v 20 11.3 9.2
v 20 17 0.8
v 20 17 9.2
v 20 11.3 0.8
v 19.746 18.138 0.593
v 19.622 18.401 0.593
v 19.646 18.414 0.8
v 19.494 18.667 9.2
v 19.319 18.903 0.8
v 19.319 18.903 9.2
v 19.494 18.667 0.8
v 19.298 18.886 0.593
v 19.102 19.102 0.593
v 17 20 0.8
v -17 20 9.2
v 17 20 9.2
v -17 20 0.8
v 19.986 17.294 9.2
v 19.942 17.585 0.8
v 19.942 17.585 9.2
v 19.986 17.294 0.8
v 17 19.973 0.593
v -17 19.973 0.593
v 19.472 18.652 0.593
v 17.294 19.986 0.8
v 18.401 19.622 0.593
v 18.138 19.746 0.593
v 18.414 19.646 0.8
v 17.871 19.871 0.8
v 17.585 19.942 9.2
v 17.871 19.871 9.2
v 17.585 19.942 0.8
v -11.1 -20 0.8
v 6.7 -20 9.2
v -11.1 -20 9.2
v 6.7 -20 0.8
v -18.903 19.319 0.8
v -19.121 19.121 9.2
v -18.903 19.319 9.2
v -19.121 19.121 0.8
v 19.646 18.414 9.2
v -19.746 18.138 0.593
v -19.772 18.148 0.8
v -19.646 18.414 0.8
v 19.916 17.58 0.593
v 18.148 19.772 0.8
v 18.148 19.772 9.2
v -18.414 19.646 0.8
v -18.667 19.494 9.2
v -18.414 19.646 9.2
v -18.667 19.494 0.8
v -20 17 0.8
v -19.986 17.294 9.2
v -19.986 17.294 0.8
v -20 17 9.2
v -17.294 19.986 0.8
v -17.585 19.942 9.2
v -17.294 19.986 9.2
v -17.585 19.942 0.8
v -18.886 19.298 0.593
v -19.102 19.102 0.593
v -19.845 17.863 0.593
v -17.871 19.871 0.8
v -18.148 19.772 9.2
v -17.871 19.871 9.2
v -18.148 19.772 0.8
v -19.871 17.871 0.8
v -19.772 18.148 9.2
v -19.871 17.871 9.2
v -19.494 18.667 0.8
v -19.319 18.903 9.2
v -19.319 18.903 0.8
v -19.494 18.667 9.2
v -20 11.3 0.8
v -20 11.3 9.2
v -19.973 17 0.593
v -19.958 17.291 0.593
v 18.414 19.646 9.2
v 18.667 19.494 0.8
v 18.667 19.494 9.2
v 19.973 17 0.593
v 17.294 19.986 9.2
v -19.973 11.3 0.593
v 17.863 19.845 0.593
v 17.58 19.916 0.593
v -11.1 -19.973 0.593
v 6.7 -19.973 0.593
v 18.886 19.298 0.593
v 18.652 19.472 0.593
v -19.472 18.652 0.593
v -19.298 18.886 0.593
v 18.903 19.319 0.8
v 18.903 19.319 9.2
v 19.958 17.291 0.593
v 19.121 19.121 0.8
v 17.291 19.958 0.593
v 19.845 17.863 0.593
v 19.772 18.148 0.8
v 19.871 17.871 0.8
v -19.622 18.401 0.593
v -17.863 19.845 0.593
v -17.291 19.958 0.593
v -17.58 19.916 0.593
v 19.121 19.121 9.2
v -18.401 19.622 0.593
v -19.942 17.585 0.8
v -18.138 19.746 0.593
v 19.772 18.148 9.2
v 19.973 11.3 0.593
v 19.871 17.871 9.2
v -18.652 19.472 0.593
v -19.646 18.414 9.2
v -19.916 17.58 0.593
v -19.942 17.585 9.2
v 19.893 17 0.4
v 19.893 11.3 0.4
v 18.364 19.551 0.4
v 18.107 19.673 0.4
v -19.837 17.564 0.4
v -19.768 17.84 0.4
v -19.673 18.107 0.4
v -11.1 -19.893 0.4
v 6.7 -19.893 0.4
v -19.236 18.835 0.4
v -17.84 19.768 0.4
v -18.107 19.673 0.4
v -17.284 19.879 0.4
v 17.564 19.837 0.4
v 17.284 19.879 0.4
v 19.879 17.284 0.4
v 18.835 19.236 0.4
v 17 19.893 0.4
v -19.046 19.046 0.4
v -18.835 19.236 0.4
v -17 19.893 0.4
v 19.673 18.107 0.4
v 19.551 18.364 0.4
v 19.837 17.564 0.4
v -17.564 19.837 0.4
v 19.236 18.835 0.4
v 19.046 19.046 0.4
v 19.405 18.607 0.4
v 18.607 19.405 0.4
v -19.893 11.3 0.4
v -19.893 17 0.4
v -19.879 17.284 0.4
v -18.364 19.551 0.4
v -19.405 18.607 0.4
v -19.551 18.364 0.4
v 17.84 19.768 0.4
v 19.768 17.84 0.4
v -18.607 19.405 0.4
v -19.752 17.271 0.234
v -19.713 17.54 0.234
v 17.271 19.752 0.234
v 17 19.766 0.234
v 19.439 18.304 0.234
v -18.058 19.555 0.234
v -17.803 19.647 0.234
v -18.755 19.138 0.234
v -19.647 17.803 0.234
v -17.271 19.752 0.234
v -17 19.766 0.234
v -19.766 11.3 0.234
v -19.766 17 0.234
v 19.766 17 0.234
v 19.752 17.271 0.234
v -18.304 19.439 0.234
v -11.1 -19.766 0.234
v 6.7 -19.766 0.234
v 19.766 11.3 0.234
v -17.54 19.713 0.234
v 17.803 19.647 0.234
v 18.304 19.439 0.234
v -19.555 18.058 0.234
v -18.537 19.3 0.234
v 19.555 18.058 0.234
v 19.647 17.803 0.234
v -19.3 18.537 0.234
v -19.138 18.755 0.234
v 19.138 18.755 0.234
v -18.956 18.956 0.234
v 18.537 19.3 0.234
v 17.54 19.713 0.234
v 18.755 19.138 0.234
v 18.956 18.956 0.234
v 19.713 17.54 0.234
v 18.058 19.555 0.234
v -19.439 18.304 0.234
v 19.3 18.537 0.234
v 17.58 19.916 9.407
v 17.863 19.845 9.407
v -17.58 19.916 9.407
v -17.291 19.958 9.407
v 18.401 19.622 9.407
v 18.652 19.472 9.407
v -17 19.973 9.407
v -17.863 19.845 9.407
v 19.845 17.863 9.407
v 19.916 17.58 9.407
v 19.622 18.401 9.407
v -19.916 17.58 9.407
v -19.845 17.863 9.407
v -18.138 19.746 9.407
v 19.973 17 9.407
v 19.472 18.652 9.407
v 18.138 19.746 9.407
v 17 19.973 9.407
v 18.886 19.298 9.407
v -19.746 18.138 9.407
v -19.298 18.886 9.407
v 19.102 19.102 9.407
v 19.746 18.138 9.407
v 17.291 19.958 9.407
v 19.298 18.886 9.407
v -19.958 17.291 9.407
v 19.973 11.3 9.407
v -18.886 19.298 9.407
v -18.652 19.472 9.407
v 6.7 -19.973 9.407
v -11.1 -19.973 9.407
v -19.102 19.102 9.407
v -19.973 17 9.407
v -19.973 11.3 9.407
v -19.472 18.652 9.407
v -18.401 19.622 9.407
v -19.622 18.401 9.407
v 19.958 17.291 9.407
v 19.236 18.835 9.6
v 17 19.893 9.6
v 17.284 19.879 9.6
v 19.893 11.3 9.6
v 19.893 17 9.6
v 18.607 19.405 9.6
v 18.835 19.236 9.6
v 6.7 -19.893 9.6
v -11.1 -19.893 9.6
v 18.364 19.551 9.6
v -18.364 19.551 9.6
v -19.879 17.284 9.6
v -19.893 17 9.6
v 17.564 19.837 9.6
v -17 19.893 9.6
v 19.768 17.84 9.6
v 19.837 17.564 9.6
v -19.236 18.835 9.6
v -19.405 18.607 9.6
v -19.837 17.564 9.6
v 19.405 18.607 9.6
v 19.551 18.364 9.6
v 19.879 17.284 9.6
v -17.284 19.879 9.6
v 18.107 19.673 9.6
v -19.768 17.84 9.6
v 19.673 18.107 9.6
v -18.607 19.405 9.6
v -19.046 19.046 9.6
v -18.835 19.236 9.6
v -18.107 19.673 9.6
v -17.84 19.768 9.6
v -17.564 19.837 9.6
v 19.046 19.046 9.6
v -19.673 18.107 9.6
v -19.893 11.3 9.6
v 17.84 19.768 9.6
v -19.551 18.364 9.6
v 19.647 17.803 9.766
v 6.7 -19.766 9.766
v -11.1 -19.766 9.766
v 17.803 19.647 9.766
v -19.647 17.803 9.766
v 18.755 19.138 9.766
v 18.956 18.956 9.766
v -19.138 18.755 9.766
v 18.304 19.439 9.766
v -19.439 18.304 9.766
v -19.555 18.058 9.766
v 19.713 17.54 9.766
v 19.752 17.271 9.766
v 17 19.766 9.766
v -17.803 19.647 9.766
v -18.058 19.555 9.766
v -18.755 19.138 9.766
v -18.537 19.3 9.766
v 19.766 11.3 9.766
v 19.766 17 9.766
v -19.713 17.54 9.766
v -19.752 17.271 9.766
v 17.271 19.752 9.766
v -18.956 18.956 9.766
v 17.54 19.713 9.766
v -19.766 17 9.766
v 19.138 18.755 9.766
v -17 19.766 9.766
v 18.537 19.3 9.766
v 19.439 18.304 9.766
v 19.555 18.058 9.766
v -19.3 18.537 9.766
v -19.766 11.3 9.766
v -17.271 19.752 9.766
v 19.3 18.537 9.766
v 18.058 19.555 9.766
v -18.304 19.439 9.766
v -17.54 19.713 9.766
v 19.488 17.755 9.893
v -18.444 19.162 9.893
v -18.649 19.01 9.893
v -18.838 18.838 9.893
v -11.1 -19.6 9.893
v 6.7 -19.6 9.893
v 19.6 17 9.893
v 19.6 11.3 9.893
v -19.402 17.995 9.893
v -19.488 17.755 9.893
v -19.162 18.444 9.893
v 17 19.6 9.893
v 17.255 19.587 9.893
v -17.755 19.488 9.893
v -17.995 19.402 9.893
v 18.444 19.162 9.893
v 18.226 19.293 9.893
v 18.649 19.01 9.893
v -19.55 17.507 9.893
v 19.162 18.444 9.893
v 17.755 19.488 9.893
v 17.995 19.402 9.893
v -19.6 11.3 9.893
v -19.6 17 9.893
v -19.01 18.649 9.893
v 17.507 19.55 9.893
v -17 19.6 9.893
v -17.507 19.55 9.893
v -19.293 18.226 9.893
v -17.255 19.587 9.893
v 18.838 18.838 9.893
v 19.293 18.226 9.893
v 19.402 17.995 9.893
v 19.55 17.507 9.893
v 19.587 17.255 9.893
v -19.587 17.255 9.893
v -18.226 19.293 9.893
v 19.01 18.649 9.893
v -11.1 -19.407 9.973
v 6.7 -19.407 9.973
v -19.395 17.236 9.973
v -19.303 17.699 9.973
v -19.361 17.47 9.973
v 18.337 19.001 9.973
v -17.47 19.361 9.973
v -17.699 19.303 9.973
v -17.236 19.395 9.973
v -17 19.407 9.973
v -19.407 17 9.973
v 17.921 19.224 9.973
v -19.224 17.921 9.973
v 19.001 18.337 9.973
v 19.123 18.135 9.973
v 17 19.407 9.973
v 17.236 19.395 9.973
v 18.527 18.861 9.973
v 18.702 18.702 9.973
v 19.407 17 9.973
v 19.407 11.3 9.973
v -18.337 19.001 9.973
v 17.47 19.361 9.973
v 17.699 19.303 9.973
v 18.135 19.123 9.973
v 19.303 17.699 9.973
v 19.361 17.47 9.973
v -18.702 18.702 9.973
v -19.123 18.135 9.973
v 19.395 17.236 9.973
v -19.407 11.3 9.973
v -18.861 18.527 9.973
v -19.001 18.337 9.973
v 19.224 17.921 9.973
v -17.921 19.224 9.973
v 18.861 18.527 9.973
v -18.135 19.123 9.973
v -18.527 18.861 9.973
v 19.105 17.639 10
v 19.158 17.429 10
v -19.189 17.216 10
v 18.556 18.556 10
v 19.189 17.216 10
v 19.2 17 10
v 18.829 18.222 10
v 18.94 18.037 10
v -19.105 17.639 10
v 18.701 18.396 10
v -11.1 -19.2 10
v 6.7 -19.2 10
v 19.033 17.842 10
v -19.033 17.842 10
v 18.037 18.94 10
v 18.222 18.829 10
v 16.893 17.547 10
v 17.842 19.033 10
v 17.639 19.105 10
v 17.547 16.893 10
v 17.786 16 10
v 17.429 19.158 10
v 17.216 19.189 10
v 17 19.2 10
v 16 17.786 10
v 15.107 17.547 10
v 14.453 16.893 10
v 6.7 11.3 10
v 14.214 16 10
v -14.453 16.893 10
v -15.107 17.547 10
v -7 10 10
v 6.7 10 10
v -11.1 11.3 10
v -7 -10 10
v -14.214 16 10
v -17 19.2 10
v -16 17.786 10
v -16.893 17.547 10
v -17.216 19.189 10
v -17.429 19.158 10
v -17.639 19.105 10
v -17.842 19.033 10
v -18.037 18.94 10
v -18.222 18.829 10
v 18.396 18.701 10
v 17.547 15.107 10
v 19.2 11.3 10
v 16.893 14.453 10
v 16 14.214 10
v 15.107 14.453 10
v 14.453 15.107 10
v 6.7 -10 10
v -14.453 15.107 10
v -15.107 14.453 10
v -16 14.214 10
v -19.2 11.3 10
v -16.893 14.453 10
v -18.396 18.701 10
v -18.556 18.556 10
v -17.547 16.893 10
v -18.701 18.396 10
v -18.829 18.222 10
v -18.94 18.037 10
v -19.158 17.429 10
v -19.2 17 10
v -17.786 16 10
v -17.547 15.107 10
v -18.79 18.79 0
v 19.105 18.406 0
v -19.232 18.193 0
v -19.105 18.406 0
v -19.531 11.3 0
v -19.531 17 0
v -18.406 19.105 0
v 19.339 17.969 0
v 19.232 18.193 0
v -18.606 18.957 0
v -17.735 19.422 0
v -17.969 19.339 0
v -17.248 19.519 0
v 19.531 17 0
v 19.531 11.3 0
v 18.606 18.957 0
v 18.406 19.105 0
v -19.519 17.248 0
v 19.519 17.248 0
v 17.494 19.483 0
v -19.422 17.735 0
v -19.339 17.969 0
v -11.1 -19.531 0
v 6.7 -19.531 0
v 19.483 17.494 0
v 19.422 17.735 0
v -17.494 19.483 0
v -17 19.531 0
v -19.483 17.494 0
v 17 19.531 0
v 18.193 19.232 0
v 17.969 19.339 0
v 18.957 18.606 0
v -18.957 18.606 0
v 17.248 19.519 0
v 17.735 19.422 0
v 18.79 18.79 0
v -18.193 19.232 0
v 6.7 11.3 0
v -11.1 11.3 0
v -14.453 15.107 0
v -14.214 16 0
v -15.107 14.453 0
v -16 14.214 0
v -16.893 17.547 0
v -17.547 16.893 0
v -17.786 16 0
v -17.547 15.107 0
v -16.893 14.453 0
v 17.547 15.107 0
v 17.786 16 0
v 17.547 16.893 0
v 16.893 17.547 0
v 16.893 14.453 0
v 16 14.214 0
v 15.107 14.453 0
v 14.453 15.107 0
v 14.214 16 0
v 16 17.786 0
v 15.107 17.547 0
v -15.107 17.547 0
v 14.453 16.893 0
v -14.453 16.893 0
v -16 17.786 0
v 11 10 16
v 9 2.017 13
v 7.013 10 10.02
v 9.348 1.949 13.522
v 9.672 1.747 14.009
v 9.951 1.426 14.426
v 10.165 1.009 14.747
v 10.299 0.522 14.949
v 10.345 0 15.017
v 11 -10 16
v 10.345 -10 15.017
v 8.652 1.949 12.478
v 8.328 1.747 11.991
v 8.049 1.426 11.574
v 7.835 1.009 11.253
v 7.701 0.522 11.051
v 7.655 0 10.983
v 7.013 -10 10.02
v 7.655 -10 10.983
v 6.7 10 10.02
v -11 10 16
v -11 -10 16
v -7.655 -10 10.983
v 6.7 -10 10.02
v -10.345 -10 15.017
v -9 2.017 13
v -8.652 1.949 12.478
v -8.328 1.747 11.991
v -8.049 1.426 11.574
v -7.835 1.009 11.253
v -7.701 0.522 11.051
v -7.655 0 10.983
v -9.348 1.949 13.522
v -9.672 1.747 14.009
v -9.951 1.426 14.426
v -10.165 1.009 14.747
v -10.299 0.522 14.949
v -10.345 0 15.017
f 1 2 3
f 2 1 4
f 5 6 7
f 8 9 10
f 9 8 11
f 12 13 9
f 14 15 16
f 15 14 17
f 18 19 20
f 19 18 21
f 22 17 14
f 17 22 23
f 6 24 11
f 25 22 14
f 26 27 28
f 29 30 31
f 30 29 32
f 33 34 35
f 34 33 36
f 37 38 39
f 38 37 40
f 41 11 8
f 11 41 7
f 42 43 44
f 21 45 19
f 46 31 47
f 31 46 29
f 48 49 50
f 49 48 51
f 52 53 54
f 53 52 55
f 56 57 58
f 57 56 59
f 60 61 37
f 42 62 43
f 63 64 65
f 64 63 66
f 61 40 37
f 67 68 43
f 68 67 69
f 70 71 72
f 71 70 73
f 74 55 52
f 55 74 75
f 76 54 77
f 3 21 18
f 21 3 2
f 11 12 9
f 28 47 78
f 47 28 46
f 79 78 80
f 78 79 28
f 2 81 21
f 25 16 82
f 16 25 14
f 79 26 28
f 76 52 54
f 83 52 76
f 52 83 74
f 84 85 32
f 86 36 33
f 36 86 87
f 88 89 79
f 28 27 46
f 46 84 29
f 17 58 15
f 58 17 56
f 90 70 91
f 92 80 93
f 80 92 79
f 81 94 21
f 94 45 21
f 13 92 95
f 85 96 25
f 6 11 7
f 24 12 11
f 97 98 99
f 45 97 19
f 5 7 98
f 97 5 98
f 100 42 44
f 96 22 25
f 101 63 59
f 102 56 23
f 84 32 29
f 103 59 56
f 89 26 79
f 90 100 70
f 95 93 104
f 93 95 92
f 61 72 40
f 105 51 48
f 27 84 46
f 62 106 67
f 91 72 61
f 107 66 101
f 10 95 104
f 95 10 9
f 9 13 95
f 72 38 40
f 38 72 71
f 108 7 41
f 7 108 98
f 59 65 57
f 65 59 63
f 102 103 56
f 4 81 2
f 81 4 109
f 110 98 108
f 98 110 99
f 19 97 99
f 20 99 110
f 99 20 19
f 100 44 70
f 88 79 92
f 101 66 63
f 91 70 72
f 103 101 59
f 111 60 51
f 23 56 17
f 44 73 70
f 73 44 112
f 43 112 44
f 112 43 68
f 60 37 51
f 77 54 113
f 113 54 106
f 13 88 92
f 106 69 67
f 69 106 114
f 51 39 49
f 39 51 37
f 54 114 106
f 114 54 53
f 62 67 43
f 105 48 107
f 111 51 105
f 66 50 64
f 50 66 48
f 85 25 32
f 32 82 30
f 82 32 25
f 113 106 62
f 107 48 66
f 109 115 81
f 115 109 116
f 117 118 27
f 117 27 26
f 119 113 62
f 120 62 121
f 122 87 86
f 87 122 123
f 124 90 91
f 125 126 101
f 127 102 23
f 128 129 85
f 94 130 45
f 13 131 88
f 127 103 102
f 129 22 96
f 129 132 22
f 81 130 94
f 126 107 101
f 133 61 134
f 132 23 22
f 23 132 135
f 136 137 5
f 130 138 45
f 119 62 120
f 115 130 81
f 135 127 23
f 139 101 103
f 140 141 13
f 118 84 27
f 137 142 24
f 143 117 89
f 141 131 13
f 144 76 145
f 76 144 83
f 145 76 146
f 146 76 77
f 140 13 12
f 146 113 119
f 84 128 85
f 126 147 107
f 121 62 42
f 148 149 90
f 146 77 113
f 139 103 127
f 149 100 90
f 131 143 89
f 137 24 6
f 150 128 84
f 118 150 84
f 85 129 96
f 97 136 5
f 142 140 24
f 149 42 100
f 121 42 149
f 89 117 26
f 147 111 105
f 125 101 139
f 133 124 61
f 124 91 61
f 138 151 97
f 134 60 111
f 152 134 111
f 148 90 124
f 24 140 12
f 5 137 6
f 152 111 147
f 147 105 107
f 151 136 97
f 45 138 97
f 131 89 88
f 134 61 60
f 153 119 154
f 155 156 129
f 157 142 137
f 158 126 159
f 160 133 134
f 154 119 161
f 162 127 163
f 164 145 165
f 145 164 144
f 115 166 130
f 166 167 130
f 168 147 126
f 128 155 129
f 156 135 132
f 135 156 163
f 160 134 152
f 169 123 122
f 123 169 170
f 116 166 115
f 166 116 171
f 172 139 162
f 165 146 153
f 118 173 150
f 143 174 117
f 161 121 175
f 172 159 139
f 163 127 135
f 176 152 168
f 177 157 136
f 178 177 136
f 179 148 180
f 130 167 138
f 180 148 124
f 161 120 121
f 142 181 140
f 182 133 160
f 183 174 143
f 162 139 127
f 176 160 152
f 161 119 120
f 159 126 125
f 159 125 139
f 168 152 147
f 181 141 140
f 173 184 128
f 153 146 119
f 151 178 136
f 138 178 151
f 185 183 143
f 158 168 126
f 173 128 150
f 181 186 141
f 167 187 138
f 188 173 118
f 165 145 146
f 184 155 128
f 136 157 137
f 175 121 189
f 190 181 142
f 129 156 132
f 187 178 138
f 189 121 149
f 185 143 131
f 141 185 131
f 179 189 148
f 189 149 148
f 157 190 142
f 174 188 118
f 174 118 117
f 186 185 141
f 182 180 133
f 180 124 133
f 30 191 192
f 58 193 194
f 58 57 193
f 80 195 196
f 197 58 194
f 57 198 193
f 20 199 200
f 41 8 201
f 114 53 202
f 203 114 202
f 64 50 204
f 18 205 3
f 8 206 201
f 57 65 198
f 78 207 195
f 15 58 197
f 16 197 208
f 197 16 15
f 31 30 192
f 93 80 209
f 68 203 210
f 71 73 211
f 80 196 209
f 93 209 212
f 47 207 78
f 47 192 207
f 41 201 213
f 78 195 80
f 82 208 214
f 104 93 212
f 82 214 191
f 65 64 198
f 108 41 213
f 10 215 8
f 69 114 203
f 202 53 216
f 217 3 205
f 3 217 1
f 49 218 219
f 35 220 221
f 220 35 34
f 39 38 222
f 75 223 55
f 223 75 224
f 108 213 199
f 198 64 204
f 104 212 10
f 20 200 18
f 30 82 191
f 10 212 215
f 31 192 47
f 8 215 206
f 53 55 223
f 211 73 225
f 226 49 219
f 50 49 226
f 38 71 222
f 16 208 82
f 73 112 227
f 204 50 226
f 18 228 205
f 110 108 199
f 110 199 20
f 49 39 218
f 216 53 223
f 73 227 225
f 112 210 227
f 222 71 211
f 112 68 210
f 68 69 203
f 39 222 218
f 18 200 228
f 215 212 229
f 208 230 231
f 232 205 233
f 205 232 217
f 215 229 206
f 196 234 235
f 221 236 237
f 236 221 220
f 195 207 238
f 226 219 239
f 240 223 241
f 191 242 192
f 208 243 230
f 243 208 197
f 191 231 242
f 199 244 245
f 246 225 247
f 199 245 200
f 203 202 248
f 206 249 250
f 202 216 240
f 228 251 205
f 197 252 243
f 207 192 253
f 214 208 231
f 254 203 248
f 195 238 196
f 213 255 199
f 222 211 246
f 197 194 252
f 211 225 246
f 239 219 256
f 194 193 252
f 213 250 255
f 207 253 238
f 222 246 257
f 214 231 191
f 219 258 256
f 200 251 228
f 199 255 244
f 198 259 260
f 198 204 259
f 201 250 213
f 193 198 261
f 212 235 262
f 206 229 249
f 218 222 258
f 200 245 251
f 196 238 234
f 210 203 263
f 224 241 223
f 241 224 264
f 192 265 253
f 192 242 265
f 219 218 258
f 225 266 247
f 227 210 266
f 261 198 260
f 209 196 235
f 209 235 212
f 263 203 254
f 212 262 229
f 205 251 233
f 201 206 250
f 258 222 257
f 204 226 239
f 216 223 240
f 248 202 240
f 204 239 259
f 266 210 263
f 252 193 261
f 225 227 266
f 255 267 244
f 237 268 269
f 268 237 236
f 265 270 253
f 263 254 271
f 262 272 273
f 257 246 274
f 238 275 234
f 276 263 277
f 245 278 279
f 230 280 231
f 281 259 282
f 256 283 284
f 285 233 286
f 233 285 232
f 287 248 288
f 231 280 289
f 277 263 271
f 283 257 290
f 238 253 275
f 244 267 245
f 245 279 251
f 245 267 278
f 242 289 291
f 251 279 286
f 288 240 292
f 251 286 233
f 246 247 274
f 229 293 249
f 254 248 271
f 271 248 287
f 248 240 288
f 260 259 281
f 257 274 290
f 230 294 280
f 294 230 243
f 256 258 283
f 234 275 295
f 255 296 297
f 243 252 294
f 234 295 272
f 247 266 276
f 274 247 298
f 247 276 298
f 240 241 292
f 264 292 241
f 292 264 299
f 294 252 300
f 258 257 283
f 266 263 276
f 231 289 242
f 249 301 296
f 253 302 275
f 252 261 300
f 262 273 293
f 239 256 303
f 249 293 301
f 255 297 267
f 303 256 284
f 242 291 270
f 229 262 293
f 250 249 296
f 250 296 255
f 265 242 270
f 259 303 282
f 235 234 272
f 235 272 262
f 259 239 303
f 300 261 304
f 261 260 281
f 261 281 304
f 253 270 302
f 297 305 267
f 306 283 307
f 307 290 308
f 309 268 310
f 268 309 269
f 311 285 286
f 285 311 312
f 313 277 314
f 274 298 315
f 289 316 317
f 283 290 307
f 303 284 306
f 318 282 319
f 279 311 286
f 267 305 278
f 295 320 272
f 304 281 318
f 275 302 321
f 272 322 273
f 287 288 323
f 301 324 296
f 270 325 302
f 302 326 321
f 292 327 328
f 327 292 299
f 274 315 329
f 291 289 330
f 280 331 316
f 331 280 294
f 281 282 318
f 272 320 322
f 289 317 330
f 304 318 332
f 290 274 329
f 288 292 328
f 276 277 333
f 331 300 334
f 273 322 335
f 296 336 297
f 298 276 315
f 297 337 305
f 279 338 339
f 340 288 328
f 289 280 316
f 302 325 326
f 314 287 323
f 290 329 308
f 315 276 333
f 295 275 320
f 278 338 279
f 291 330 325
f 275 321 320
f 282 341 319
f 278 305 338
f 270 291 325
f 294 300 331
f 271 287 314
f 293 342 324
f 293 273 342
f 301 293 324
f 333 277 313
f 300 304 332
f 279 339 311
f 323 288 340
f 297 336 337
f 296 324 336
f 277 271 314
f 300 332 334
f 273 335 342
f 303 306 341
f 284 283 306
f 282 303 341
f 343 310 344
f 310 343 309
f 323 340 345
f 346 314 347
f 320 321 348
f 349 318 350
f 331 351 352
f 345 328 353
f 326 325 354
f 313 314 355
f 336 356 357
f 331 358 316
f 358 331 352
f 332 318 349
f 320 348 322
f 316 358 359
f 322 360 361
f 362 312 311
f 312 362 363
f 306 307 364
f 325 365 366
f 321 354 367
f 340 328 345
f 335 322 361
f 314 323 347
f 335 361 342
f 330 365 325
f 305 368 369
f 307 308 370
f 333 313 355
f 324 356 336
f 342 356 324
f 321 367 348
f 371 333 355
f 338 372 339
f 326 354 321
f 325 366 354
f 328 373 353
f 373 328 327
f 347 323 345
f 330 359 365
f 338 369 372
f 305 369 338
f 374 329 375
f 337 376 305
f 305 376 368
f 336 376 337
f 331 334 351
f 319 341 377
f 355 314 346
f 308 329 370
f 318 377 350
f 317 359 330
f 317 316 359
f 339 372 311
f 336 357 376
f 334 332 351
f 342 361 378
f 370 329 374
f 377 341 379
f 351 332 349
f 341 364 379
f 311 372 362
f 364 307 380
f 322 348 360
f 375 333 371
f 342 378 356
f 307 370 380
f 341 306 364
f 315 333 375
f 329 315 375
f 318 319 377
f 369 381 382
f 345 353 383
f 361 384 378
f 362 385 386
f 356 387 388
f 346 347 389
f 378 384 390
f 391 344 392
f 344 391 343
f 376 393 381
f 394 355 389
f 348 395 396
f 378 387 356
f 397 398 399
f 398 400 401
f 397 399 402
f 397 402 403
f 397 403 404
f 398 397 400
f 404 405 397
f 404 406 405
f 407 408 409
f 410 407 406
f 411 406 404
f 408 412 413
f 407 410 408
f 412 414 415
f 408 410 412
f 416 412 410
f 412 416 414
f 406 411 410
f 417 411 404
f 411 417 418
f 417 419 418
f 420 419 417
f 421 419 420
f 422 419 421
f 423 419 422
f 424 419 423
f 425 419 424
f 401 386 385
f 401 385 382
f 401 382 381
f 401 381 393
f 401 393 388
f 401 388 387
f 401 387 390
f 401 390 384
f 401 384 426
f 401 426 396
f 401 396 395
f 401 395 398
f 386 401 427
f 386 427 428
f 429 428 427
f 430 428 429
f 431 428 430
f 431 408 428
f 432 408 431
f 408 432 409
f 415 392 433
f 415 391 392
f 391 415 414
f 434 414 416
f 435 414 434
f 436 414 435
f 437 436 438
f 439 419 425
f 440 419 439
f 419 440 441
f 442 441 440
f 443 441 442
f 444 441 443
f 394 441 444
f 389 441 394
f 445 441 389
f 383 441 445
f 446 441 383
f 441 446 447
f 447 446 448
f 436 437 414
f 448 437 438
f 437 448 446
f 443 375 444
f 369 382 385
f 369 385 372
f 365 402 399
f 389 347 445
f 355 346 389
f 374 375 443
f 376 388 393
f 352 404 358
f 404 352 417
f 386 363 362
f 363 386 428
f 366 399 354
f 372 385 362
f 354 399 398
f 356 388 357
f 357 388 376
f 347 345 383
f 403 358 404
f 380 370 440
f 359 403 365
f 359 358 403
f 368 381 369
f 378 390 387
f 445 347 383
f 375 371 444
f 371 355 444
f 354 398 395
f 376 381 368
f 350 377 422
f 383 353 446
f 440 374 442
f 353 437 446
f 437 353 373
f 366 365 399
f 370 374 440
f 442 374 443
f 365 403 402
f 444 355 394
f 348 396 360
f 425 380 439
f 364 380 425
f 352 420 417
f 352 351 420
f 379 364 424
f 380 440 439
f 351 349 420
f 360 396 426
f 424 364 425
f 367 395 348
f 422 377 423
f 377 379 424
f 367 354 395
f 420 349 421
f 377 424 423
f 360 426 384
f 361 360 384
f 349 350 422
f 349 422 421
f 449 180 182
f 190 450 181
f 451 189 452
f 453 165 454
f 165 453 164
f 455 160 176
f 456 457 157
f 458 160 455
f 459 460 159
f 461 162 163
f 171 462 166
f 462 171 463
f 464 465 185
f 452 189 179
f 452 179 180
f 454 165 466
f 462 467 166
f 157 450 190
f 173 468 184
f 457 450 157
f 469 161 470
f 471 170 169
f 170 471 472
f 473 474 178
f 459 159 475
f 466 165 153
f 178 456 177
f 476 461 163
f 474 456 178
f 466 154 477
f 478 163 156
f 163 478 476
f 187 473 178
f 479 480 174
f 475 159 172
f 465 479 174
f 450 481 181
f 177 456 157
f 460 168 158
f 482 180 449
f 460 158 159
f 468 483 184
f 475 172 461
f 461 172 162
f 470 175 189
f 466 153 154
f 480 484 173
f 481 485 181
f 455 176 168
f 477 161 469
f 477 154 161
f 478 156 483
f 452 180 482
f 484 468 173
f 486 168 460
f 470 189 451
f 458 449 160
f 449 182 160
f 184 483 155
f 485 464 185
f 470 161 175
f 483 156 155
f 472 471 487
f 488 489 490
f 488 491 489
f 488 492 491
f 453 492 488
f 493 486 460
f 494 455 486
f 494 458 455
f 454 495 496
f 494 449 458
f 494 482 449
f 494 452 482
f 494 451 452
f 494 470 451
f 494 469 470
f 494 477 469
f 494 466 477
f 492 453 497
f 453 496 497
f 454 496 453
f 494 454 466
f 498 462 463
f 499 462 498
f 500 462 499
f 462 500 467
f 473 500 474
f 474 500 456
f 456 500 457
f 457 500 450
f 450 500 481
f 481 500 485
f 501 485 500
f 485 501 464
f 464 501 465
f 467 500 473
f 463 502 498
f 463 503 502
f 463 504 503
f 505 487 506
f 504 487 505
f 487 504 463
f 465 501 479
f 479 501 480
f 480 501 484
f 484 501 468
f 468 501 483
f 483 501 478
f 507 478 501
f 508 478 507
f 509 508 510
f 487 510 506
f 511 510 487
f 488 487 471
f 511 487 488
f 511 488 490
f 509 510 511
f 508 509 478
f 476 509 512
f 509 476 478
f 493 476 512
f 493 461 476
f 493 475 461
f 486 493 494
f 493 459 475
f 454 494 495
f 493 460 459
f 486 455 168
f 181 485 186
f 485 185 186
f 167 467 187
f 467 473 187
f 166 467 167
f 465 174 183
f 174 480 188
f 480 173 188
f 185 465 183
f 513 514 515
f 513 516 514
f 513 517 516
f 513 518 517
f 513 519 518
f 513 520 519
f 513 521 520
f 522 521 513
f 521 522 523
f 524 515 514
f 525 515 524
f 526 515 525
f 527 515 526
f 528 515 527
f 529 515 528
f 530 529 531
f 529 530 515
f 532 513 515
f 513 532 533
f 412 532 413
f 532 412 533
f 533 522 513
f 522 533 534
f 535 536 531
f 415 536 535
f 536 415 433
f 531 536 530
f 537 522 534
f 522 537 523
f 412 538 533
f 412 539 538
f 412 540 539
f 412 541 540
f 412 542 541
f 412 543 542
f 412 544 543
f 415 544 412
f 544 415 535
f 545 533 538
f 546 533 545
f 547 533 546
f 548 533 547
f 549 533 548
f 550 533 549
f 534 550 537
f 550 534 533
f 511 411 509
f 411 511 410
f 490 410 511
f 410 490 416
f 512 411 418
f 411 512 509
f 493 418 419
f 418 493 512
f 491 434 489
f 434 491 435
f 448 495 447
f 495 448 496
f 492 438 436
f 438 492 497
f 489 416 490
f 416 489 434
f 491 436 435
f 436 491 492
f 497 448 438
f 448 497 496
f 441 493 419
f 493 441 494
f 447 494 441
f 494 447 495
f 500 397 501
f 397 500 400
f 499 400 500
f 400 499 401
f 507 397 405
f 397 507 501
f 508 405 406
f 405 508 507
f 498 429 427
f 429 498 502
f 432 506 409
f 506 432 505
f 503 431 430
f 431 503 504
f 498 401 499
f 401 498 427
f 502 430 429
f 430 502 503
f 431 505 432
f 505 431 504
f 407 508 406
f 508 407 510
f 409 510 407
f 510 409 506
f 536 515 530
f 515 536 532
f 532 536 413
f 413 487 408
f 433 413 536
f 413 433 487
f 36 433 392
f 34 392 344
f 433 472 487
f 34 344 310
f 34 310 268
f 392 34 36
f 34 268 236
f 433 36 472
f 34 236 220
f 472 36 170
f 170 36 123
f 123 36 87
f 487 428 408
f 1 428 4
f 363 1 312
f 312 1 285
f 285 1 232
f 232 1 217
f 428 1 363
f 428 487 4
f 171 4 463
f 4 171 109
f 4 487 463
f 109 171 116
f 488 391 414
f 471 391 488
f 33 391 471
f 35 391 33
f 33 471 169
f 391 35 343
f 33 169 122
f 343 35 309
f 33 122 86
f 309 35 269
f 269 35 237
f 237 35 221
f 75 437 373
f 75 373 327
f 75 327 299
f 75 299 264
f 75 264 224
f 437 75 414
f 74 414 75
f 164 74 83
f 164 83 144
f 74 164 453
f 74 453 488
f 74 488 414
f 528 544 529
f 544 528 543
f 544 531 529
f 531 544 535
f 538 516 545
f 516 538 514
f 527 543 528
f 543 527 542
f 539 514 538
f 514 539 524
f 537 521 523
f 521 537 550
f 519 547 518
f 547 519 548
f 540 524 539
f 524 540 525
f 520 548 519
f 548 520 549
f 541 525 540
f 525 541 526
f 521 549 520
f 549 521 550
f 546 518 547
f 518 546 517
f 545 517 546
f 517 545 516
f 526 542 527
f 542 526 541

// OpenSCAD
// Reusable trial interfaces, mm. Authoritative geometry; no rated load.
use <../../../../scad/lib/util.scad>
/* [Output] */
part = "slide_male"; // [slide_male,slide_female,slide_gib,snap_male,snap_female,twist_male,twist_male_mount,twist_female,knob,twist_knob]
/* [Common interface - provisional] */
pad = 40;
pad_t = 4;
mount_pitch = 32;
mount_d = 3.45;
gap = 0.30; // per-side fit allowance
edge_relief = 0.35;
touch_fillet = 0.8; // exposed upper edges; keep flat print/mounting faces
plate_corner_r = 3;
/* [Metal hardware - measure before printing] */
bolt_nominal = 3;
slide_bolt_length = 40;
twist_bolt_length = 40;
thread_pitch = 0.5;
unlock_turns = 3;
bolt_d = bolt_nominal + 0.45;
hex_af = 5.75; // M3 head/nut nominal AF5.5, +0.25
head_seat = 3.8; // knob bearing face to underside of bolt HEAD
slide_nut_x = -16.5;
twist_nut_x = -15.5;
nut_loading_clearance = 0.15;
washer_d = 7;
washer_id = 3.2;
washer_t = 0.5;
metal_af = 5.5;
metal_nut_t = 2.4;
metal_head_h = 2.12;
knob_d = 22;
knob_h = 10;
/* [Dovetail] */
slide_plate_t = 10; // thicker upper mounting plate clears the D22 knob
rail_l = 20;
rail_neck = 14;
rail_head = 22;
rail_h = 6;
slide_floor = 9; // raises the knob swept envelope above the mounting plane
slide_cheek_x = -14;
slide_gib_x = 18;
slide_preload_x = gap*(1+(rail_head-rail_neck)/(2*rail_h));
slide_opening = 1.0;
slide_slot_d = 4.0;
/* [Side release] */
arm_l = 36;
arm_t = 1.4;
arm_x = 9;
snap_t = 4;
snap_floor = 3;
snap_inner = 22.6;
snap_wall = 2.5;
snap_roof = 2.4;
hook_out = 15.3;
hook_back = 15.3;
hook_ramp = 19;
snap_entry = -12;
snap_end = 27;
snap_tab_l = 12;
snap_seat_y = -0.15;
/* [Bayonet] */
twist_plate_t = 6; // upper mounting plate, female base remains 4 mm
post_d = 14;
post_h = 8;
lug_r = 10.5;
lug_w = 6;
lug_t = 3;
ring_d = 28;
ring_h = 14;
turn_deg = 60;
entry_angle = 80;
twist_face_x = 20; // through bolt runs from the left cheek to the right knob
twist_axis_z = 14;
twist_knob_d = 16; // keep the entire side knob below the upper mounting plane
twist_cam_lift = 0.60; // axial draw over the 60-degree turn
twist_pad_t = 1.0; // user-confirmed rubber thickness; not a printed part
twist_pad_depth = 0.40; // shallow male-side pocket retains 40% of rubber thickness
twist_pad_side_clearance = 0.20; // each side of the 5 x 8 mm rubber cut
twist_pad_compression = 0.10; // provisional nominal squeeze
twist_lock_gap = twist_pad_t-twist_pad_depth-twist_pad_compression;
twist_pad_w = 5.0; // X/radial cut width
twist_pad_l = 8.0; // Y/tangential cut length
twist_pad_r = 10.5; // centres of two rectangular pads on male underside
/* [Hidden] */
$fn = 64;
eps = 0.02;
slide_z = slide_plate_t + slide_floor + rail_h + gap;
slide_axis_z = slide_floor + rail_h/2;
track_floor = pad_t + ring_h - post_h;
twist_z = pad_t + ring_h + twist_plate_t + twist_lock_gap;
snap_socket_h = snap_floor + snap_t + 2*gap + snap_roof;
assert(gap > 0 && gap < 0.8);
assert(rail_head > rail_neck && rail_head/2+gap < pad/2-2);
assert(hex_af > metal_af && knob_h-head_seat >= metal_head_h);
assert(slide_nut_x-nut_loading_clearance > -pad/2+2);
assert(twist_nut_x-nut_loading_clearance > -pad/2+2);
assert(slide_z-gap-slide_axis_z-knob_d/2 >= 1);
assert(thread_pitch*unlock_turns >= slide_opening);
assert(twist_axis_z+4 <= pad_t+ring_h);
assert(twist_axis_z+twist_knob_d/2 < twist_z);
assert(hook_out > snap_inner/2 && arm_x-arm_t/2 > 5);
assert(ring_d/2 > sqrt(pow(lug_r+gap,2)+pow(lug_w/2+gap,2))+2);
assert(twist_pad_depth > 0 && twist_pad_depth < twist_pad_t);
assert(twist_pad_compression > 0 && twist_pad_compression < twist_pad_t*0.15);
assert(twist_lock_gap > 0);
assert(twist_pad_r-twist_pad_w/2-twist_pad_side_clearance > post_d/2+0.5);
assert(sqrt(pow(twist_pad_r+twist_pad_w/2+twist_pad_side_clearance,2)+pow(twist_pad_l/2+twist_pad_side_clearance,2)) < ring_d/2-0.1);
function twist_cam_height(a) = track_floor+lug_t+twist_lock_gap+twist_cam_lift*(1-a/turn_deg);
function twist_draw_offset(angle) = twist_cam_lift*min(1,max(0,-angle/turn_deg));

module mounting_holes(y0=0, y_pitch=mount_pitch, thickness=pad_t) {
    for(x=[-mount_pitch/2,mount_pitch/2],y=[y0-y_pitch/2,y0+y_pitch/2])
        translate([x,y,-eps]) hole(mount_d,thickness+2*eps,fn=12);
}
module pad_blank(y0=0, thickness=pad_t) {
    translate([-pad/2,y0-pad/2,0]) touch_box(pad,pad,thickness,plate_corner_r);
}
// Quarter-circle top fillet, using convex loft segments instead of a costly
// global Minkowski operation that would alter holes and mating surfaces.
module touch_box(w,d,h,r=1,fillet=touch_fillet) {
    f=min(fillet,h/3,r);
    translate([0,0,f]) rrect_prism(w,d,h-2*f,r);
    // Lower fillet is trimmed at 45 degrees into a bed chamfer. This keeps
    // layer growth <= layer height instead of the steep start of a full fillet.
    hull() {
        inset=max(edge_relief,f*(2-sqrt(2)));
        translate([inset,inset,0]) rrect_prism(w-2*inset,d-2*inset,eps,max(0.1,r-inset));
        inset2=f*(1-cos(45));
        translate([inset2,inset2,f*(1-sin(45))])
            rrect_prism(w-2*inset2,d-2*inset2,eps,max(0.1,r-inset2));
    }
    for(a=[0:15:30]) hull() for(t=[a,a+15]) {
        inset=f*(1-cos(t));
        translate([inset,inset,f*(1-sin(t))])
            rrect_prism(w-2*inset,d-2*inset,eps,max(0.1,r-inset));
    }
    for(a=[0:15:75]) hull() for(t=[a,a+15]) {
        inset=f*(1-cos(t));
        translate([inset,inset,h-f+f*sin(t)-eps])
            rrect_prism(w-2*inset,d-2*inset,eps,max(0.1,r-inset));
    }
}
module hex_cut(depth) {
    rotate([0,0,30]) cylinder(r=hex_af/sqrt(3),h=depth,$fn=6);
}
// Horizontal screw bore: round part + upward 45-degree roof relief.
module x_bore(length) {
    roof_tip = (bolt_d/2)/cos(180/16)*sqrt(2);
    rotate([0,90,0]) hole(bolt_d,length,fn=16);
    translate([0,-roof_tip,0]) rotate([0,90,0])
        linear_extrude(length) polygon([[0,0],[-roof_tip,roof_tip],[0,2*roof_tip]]);
}
// Recessed nut receiver: no external clip; continuous body within the pad footprint.
// Upward loading channel has no roof and therefore needs no internal support.
module fixed_nut_blank(z_axis) {
    translate([-pad/2,-5,pad_t-eps]) touch_box(pad/2-12,10,z_axis+4-pad_t+eps,1);
}
module fixed_nut_cuts(nut_x,z_axis) {
    translate([nut_x-nut_loading_clearance,0,z_axis]) rotate([0,90,0])
        hex_cut(metal_nut_t+nut_loading_clearance);
    translate([nut_x-nut_loading_clearance,-hex_af/sqrt(3),z_axis])
        cube([metal_nut_t+nut_loading_clearance,2*hex_af/sqrt(3),4+eps]);
}
module hand_knob(diameter=knob_d) {
    difference() {
        union() {
            rounded_knob_cylinder(diameter-3);
            for(a=[0:60:300]) rotate([0,0,a]) translate([(diameter-5)/2,0,0]) rounded_knob_cylinder(5);
        }
        translate([0,0,-eps]) hole(bolt_d,knob_h+2*eps,fn=16);
        // Bolt head bears on a 3.8 mm floor. Hex shape transmits torque.
        // A small adhesive spot keeps the head with the knob when removed.
        translate([0,0,head_seat]) hex_cut(knob_h-head_seat+eps);
    }
}
module rounded_knob_cylinder(d) {
    cylinder(d=d,h=knob_h-touch_fillet);
    for(a=[0:15:75]) hull() for(t=[a,a+15])
        translate([0,0,knob_h-touch_fillet+touch_fillet*sin(t)-eps])
            cylinder(d=d-2*touch_fillet*(1-cos(t)),h=eps);
}

// Male is printed pad down. Closed assembly flips it over the female.
module rail_profile(extra=0) {
    polygon([[-rail_neck/2-extra,slide_plate_t], [rail_neck/2+extra,slide_plate_t],
             [rail_head/2+extra,slide_plate_t+rail_h],[-rail_head/2-extra,slide_plate_t+rail_h]]);
}
module slide_male() {
    difference() {
        union() {
            pad_blank(thickness=slide_plate_t);
            // rotate maps the profile XY to XZ, extrusion along -Y
            translate([0,rail_l/2,0]) rotate([90,0,0]) linear_extrude(rail_l) rail_profile();
        }
        mounting_holes(thickness=slide_plate_t);
        // Open plate notches clear the gib and left head cradle during withdrawal.
        translate([rail_neck/2-gap,-pad/2-eps,-eps]) cube([pad,pad/2+11.3+eps,slide_plate_t+2*eps]);
        translate([-pad+slide_cheek_x+2+slide_preload_x+gap+0.1,-pad/2-eps,-eps]) cube([pad,pad/2+11.3+eps,slide_plate_t+2*eps]);
        // Longitudinal open slot: the through bolt can stay in place when sliding out.
        hull() for(y=[0,-rail_l/2-slide_slot_d])
            translate([-rail_head,y,slide_plate_t+rail_h/2]) rotate([0,90,0])
                hole(slide_slot_d,2*rail_head,fn=24);
    }
}
module slide_female() {
    difference() {
        union() {
            pad_blank();
            translate([-rail_head/2-3,-rail_l/2,pad_t-eps]) touch_box(rail_head+6,rail_l,slide_floor-pad_t+rail_h+eps,1);
            translate([-rail_head/2-3,rail_l/2+gap,pad_t-eps]) touch_box(rail_head+6,3,slide_floor-pad_t+rail_h+eps,1);
            translate([slide_cheek_x,-5,pad_t]) touch_box(2,10,12.2,0.6);
            // Broad recessed fixed-nut receiver, integral with base and left cheek.
            fixed_nut_blank(slide_axis_z);
        }
        mounting_holes();
        // Channel widens downward; the lips provide positive Z retention.
        translate([0,rail_l/2,0]) rotate([90,0,0]) linear_extrude(rail_l+1)
            polygon([[-rail_head/2-gap-gap*(rail_head-rail_neck)/(2*rail_h),slide_floor],
                     [rail_head/2+gap+gap*(rail_head-rail_neck)/(2*rail_h),slide_floor],
                     [rail_neck/2+gap,slide_floor+rail_h+gap],[-rail_neck/2-gap,slide_floor+rail_h+gap]]);
        // Separate moving right flank and its chamfered foot.
        translate([5.8,-rail_l/2-eps,slide_floor]) cube([pad,rail_l+2*eps,rail_h+3]);
        translate([rail_head/2-slide_preload_x-gap,-rail_l/2-eps,pad_t])
            cube([pad,rail_l+2*eps,slide_floor-pad_t]);
        // Clear the lower swept rim of the nut knob; keep all four mounting holes.
        translate([slide_gib_x+washer_t-gap,-knob_d/2-gap,-eps])
            cube([pad,knob_d+2*gap,pad_t+2*eps]);
        translate([-pad,0,slide_axis_z]) x_bore(2*pad);
        fixed_nut_cuts(slide_nut_x,slide_axis_z);
    }
}

// Print with outer X face down: vertical bolt bore and no enclosed roof.
module slide_gib(opening=0) {
    translate([opening,0,0]) difference() {
        translate([0,rail_l/2,0]) rotate([90,0,0]) linear_extrude(rail_l)
            polygon([[rail_head/2-slide_preload_x+0.8,slide_floor-1.2],
                     [slide_gib_x,slide_floor-1.2],[slide_gib_x,slide_floor+rail_h+1.2],
                     [rail_neck/2-slide_preload_x,slide_floor+rail_h+1.2],
                     [rail_neck/2-slide_preload_x,slide_floor+rail_h],
                     [rail_head/2-slide_preload_x,slide_floor]]);
        translate([0,0,slide_axis_z]) x_bore(pad);
    }
}

// Planar cantilevers: squeeze both hooks inward to release.
module snap_male(squeeze=0) {
    difference() {
        union() {
            translate([-pad/2,snap_entry-snap_tab_l,0]) touch_box(pad,snap_tab_l,snap_t,plate_corner_r);
            translate([-3,snap_entry-eps,0]) cube([6,24+eps,snap_t]);
            for(s=[-1,1]) scale([s,1,1]) {
                // Shear is a kinematic envelope, NOT an elastic FEA solution.
                multmatrix([[1,-squeeze/arm_l,0,squeeze*snap_entry/arm_l],[0,1,0,0],[0,0,1,0],[0,0,0,1]])
                    union() {
                        translate([arm_x-arm_t/2,snap_entry-eps,0]) cube([arm_t,arm_l+eps,snap_t]);
                        linear_extrude(snap_t) polygon([[arm_x-arm_t/2,hook_back], [hook_out,hook_back],
                            [hook_out,hook_ramp],[arm_x+arm_t/2,snap_entry+arm_l], [arm_x-arm_t/2,snap_entry+arm_l]]);
                    }
                translate([arm_x,snap_entry+0.5,0]) cylinder(r=arm_t,h=snap_t);
            }
        }
        for(x=[-mount_pitch/2,mount_pitch/2]) translate([x,snap_entry-snap_tab_l/2,-eps]) hole(mount_d,snap_t+2*eps,fn=12);
    }
}
module snap_female() {
    difference() {
        union() {
            // Rear edge aligned with socket rear: mouth-up printing has a flat foot.
            translate([-pad/2,snap_entry,0]) touch_box(pad,snap_end-snap_entry,snap_floor,plate_corner_r);
            translate([-snap_inner/2-snap_wall,snap_entry,0])
                touch_box(snap_inner+2*snap_wall,snap_end-snap_entry,snap_socket_h,1);
        }
        translate([-snap_inner/2,snap_entry-eps,snap_floor]) cube([snap_inner,snap_end-snap_entry-2+eps,snap_t+2*gap]);
        for(s=[-1,1]) scale([s,1,1]) translate([snap_inner/2-eps,hook_back-gap,snap_floor-gap])
            cube([snap_wall+2*eps,snap_end-2-(hook_back-gap),snap_t+4*gap]);
        for(x=[-mount_pitch/2,mount_pitch/2],y=[snap_entry+4,snap_end-4]) {
            translate([x,y,-eps]) hole(mount_d,snap_floor+2*eps,fn=12);
            // Access for M3 heads at the edge of the socket side wall.
            translate([x,y,snap_floor]) hole(6.3,snap_socket_h,fn=24);
        }
    }
}

module twist_lugs(extra=0,phase=0) {
    for(a=[phase,phase+180]) rotate([0,0,a]) translate([post_d/2-1,-lug_w/2-extra,0])
        union() {
            cube([lug_r-post_d/2+1+extra,lug_w+2*extra,lug_t+2*extra]);
            translate([0,lug_w+2*extra,0]) rotate([90,0,0]) linear_extrude(lug_w+2*extra)
                polygon([[0,0],[2.5+extra,0],[1,-1.5]]);
        }
}
module twist_track_profile(extra=gap) {
    for(a=[entry_angle,entry_angle+180]) rotate(a)
        translate([post_d/2-1,-lug_w/2-extra])
            square([lug_r-post_d/2+1+extra,lug_w+2*extra]);
}
module twist_male() {
    difference() {
        union() {
            pad_blank(thickness=twist_plate_t);
            translate([0,0,twist_plate_t-eps]) cylinder(d=post_d,h=post_h+eps);
            translate([0,0,twist_plate_t+post_h-lug_t]) twist_lugs(phase=-entry_angle-turn_deg);
        }
        mounting_holes(thickness=twist_plate_t);
        // Upward-open shallow seats retain the rectangular rubber on the lid.
        // Square inside corners fit hand-cut pads; no enclosed support surfaces.
        for(s=[-1,1])
            translate([s*twist_pad_r-twist_pad_w/2-twist_pad_side_clearance,
                       -twist_pad_l/2-twist_pad_side_clearance,
                       twist_plate_t-twist_pad_depth])
                cube([twist_pad_w+2*twist_pad_side_clearance,
                      twist_pad_l+2*twist_pad_side_clearance,
                      twist_pad_depth+eps]);
        // Native X flip preserves the horizontal axis when the plates align.
        translate([-post_d,0,twist_z-twist_axis_z]) x_bore(2*post_d);
    }
}
// Mounted C male: recess M3 90-degree flat heads within the 6 mm plate.
// Preserve the original cam, lugs, pad pockets and mating surfaces. Standard
// male remains unchanged. A D5.5 head seats 0.425 mm inside the mating face.
module twist_male_mount() {
    difference() {
        twist_male();
        for(x=[-mount_pitch/2,mount_pitch/2],y=[-mount_pitch/2,mount_pitch/2])
            translate([x,y,twist_plate_t-1.45])
                cylinder(d1=mount_d,d2=mount_d+2*(1.45+eps),h=1.45+eps,$fn=48);
    }
}
module twist_female() {
    difference() {
        union() {
            pad_blank();
            translate([0,0,pad_t-eps]) cylinder(d=ring_d,h=ring_h+eps);
            for(s=[-1,1]) scale([s,1,1])
                translate([ring_d/2-2,-5,pad_t-eps])
                    touch_box(twist_face_x-ring_d/2+2,10,twist_axis_z+3.8-pad_t+eps,1);
            fixed_nut_blank(twist_axis_z);
        }
        mounting_holes();
        translate([0,0,pad_t]) hole(post_d+2*gap,ring_h+eps,fn=64);
        // Entry slots continue down to the circular retaining tracks.
        for(a=[entry_angle,entry_angle+180]) rotate([0,0,a]) translate([0,-lug_w/2-gap,track_floor])
            cube([lug_r+gap,lug_w+2*gap,pad_t+ring_h-track_floor+eps]);
        // Descending cam bearing roof draws the plate towards the four pads.
        // 45-degree gusset clearance remains above the bearing land.
        for(a=[0:3:turn_deg-3],phase=[entry_angle,entry_angle+180]) hull() {
            for(ang=[a+phase,a+3+phase]) rotate([0,0,ang]) {
                ceiling=twist_cam_height(ang-phase);
                translate([0,lug_w/2+gap,0]) rotate([90,0,0])
                    linear_extrude(lug_w+2*gap) polygon([
                        [post_d/2-1,ceiling-lug_t-2*gap],
                        [lug_r+gap,ceiling-lug_t-2*gap],
                        [lug_r+gap,ceiling],
                        [post_d/2+1.5+gap,ceiling],
                        [post_d/2+gap,ceiling+1.5],
                        [post_d/2-1,ceiling+1.5]]);
            }
        }
        // The upper rim stays flat; the pockets are in the male lid.
        translate([-pad,0,twist_axis_z]) x_bore(2*pad);
        fixed_nut_cuts(twist_nut_x,twist_axis_z);
    }
}

// Assembly coordinate transforms; same numbers are recorded in placement.json.
module seated_male(kind="slide",travel=0,angle=0,squeeze=0,clamped=false) {
    if(kind=="slide") translate([clamped ? -slide_preload_x : 0,-travel,slide_z-(clamped ? gap : 0)]) rotate([180,0,0]) slide_male();
    if(kind=="snap") translate([0,snap_seat_y-travel,snap_floor+gap]) snap_male(squeeze);
    if(kind=="twist") translate([0,0,twist_z+twist_draw_offset(angle)+travel]) rotate([0,0,angle]) rotate([180,0,0]) twist_male();
}
// Non-print preview envelopes: the exposed rubber moves with its male-side pocket.
module twist_pad_reference(compressed=true,bearing_margin=0,angle=0,travel=0) {
    h=compressed ? twist_lock_gap : twist_pad_t-twist_pad_depth;
    plate_bottom=pad_t+ring_h+twist_lock_gap+twist_draw_offset(angle)+travel;
    translate([0,0,plate_bottom-h]) rotate([0,0,angle])
        for(s=[-1,1]) translate([s*twist_pad_r-twist_pad_w/2+bearing_margin,-twist_pad_l/2+bearing_margin,bearing_margin])
            cube([twist_pad_w-2*bearing_margin,twist_pad_l-2*bearing_margin,h-2*bearing_margin]);
}

module placed_knob(kind="slide",loosen=0,clamped=true) {
    if(kind=="slide") translate([slide_gib_x+washer_t+loosen,0,slide_axis_z]) rotate([0,90,0]) hand_knob();
    if(kind=="twist") translate([twist_face_x+washer_t+loosen,0,twist_axis_z]) rotate([0,90,0]) hand_knob(twist_knob_d);
}
// Ideal smooth metal envelopes, for fit checks/preview only. Not print outputs.
module metal_washer(bearing_margin=0) {
    difference() { translate([0,0,bearing_margin]) cylinder(d=washer_d,h=washer_t-2*bearing_margin);
        translate([0,0,-eps]) cylinder(d=washer_id,h=washer_t+2*eps); }
}
module nut_reference(bearing_margin=0) {
    difference() { translate([0,0,bearing_margin]) rotate(30) cylinder(r=metal_af/sqrt(3),h=metal_nut_t-bearing_margin,$fn=6);
        translate([0,0,-eps]) cylinder(d=bolt_nominal,h=metal_nut_t+2*eps); }
}
module through_bolt(kind="slide",bearing_margin=0,include_washer=true,loosen=0) {
    face = kind=="slide" ? slide_gib_x : twist_face_x;
    axis = kind=="slide" ? slide_axis_z : twist_axis_z;
    length = kind=="slide" ? slide_bolt_length : twist_bolt_length;
    translate([face+washer_t+head_seat+loosen,0,axis]) {
        rotate([0,-90,0]) cylinder(d=bolt_nominal,h=length);
        rotate([0,90,0]) translate([0,0,bearing_margin]) rotate(30)
            cylinder(r=metal_af/sqrt(3),h=metal_head_h-bearing_margin,$fn=6);
    }
    if(include_washer) translate([face+loosen,0,axis]) rotate([0,90,0]) metal_washer(bearing_margin);
}
module fixed_nut(kind="slide",bearing_margin=0) {
    nut_x = kind=="slide" ? slide_nut_x : twist_nut_x;
    axis = kind=="slide" ? slide_axis_z : twist_axis_z;
    translate([nut_x,0,axis]) rotate([0,90,0]) difference() {
        rotate(30) cylinder(r=metal_af/sqrt(3),h=metal_nut_t-bearing_margin,$fn=6);
        translate([0,0,-eps]) cylinder(d=bolt_nominal+0.02,h=metal_nut_t+2*eps);
    }
}
module metal_stack(kind="slide",loosen=0,clamped=true,bearing_margin=0) {
    through_bolt(kind,bearing_margin,loosen=loosen);
    fixed_nut(kind,bearing_margin);
}
module receiver(kind="slide") {
    if(kind=="slide") slide_female();
    if(kind=="snap") snap_female();
    if(kind=="twist") twist_female();
}

if(part=="slide_male") slide_male();
else if(part=="slide_female") slide_female();
else if(part=="slide_gib") slide_gib();
else if(part=="snap_male") snap_male();
else if(part=="snap_female") snap_female();
else if(part=="twist_male") twist_male();
else if(part=="twist_male_mount") twist_male_mount();
else if(part=="twist_female") twist_female();
else if(part=="knob") hand_knob();
else if(part=="twist_knob") hand_knob(twist_knob_d);
else assert(false,"Unknown part selector");
